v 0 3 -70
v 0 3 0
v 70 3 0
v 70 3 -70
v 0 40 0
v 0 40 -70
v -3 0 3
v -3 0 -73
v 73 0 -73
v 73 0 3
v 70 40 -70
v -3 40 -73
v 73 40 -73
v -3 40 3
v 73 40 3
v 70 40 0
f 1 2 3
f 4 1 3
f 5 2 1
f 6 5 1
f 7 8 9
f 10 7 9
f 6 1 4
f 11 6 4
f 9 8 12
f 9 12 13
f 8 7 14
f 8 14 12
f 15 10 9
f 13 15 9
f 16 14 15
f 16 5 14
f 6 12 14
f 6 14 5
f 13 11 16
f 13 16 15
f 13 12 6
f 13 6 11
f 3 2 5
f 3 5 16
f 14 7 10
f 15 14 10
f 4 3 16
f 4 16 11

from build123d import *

# Parameters (mm, degrees)
SKETCH1_W           = 76
SKETCH1_H           = 76
SKETCH1_W_2         = 70
SKETCH1_H_2         = 70
BOSS_EXTRUDE1_DEPTH = 40
SKETCH2_W           = 70
SKETCH2_H           = 70
BOSS_EXTRUDE2_DEPTH = 3


with BuildPart() as part:
    # Sketch1 → Boss-Extrude1 (new body)
    with BuildSketch(Plane(origin=(0, 0, 0), x_dir=(1, 0, 0), z_dir=(0, 1, 0))):
        with Locations((35, 35)):
            Rectangle(SKETCH1_W, SKETCH1_H)
        with Locations((35, 35)):
            Rectangle(SKETCH1_W_2, SKETCH1_H_2, mode=Mode.SUBTRACT)
    extrude(amount=BOSS_EXTRUDE1_DEPTH)

    # Sketch2 → Boss-Extrude2 (add)
    with BuildSketch(Plane.XZ):
        with Locations((35, -35)):
            Rectangle(SKETCH2_W, SKETCH2_H)
    extrude(amount=-BOSS_EXTRUDE2_DEPTH)


solid = part.part
